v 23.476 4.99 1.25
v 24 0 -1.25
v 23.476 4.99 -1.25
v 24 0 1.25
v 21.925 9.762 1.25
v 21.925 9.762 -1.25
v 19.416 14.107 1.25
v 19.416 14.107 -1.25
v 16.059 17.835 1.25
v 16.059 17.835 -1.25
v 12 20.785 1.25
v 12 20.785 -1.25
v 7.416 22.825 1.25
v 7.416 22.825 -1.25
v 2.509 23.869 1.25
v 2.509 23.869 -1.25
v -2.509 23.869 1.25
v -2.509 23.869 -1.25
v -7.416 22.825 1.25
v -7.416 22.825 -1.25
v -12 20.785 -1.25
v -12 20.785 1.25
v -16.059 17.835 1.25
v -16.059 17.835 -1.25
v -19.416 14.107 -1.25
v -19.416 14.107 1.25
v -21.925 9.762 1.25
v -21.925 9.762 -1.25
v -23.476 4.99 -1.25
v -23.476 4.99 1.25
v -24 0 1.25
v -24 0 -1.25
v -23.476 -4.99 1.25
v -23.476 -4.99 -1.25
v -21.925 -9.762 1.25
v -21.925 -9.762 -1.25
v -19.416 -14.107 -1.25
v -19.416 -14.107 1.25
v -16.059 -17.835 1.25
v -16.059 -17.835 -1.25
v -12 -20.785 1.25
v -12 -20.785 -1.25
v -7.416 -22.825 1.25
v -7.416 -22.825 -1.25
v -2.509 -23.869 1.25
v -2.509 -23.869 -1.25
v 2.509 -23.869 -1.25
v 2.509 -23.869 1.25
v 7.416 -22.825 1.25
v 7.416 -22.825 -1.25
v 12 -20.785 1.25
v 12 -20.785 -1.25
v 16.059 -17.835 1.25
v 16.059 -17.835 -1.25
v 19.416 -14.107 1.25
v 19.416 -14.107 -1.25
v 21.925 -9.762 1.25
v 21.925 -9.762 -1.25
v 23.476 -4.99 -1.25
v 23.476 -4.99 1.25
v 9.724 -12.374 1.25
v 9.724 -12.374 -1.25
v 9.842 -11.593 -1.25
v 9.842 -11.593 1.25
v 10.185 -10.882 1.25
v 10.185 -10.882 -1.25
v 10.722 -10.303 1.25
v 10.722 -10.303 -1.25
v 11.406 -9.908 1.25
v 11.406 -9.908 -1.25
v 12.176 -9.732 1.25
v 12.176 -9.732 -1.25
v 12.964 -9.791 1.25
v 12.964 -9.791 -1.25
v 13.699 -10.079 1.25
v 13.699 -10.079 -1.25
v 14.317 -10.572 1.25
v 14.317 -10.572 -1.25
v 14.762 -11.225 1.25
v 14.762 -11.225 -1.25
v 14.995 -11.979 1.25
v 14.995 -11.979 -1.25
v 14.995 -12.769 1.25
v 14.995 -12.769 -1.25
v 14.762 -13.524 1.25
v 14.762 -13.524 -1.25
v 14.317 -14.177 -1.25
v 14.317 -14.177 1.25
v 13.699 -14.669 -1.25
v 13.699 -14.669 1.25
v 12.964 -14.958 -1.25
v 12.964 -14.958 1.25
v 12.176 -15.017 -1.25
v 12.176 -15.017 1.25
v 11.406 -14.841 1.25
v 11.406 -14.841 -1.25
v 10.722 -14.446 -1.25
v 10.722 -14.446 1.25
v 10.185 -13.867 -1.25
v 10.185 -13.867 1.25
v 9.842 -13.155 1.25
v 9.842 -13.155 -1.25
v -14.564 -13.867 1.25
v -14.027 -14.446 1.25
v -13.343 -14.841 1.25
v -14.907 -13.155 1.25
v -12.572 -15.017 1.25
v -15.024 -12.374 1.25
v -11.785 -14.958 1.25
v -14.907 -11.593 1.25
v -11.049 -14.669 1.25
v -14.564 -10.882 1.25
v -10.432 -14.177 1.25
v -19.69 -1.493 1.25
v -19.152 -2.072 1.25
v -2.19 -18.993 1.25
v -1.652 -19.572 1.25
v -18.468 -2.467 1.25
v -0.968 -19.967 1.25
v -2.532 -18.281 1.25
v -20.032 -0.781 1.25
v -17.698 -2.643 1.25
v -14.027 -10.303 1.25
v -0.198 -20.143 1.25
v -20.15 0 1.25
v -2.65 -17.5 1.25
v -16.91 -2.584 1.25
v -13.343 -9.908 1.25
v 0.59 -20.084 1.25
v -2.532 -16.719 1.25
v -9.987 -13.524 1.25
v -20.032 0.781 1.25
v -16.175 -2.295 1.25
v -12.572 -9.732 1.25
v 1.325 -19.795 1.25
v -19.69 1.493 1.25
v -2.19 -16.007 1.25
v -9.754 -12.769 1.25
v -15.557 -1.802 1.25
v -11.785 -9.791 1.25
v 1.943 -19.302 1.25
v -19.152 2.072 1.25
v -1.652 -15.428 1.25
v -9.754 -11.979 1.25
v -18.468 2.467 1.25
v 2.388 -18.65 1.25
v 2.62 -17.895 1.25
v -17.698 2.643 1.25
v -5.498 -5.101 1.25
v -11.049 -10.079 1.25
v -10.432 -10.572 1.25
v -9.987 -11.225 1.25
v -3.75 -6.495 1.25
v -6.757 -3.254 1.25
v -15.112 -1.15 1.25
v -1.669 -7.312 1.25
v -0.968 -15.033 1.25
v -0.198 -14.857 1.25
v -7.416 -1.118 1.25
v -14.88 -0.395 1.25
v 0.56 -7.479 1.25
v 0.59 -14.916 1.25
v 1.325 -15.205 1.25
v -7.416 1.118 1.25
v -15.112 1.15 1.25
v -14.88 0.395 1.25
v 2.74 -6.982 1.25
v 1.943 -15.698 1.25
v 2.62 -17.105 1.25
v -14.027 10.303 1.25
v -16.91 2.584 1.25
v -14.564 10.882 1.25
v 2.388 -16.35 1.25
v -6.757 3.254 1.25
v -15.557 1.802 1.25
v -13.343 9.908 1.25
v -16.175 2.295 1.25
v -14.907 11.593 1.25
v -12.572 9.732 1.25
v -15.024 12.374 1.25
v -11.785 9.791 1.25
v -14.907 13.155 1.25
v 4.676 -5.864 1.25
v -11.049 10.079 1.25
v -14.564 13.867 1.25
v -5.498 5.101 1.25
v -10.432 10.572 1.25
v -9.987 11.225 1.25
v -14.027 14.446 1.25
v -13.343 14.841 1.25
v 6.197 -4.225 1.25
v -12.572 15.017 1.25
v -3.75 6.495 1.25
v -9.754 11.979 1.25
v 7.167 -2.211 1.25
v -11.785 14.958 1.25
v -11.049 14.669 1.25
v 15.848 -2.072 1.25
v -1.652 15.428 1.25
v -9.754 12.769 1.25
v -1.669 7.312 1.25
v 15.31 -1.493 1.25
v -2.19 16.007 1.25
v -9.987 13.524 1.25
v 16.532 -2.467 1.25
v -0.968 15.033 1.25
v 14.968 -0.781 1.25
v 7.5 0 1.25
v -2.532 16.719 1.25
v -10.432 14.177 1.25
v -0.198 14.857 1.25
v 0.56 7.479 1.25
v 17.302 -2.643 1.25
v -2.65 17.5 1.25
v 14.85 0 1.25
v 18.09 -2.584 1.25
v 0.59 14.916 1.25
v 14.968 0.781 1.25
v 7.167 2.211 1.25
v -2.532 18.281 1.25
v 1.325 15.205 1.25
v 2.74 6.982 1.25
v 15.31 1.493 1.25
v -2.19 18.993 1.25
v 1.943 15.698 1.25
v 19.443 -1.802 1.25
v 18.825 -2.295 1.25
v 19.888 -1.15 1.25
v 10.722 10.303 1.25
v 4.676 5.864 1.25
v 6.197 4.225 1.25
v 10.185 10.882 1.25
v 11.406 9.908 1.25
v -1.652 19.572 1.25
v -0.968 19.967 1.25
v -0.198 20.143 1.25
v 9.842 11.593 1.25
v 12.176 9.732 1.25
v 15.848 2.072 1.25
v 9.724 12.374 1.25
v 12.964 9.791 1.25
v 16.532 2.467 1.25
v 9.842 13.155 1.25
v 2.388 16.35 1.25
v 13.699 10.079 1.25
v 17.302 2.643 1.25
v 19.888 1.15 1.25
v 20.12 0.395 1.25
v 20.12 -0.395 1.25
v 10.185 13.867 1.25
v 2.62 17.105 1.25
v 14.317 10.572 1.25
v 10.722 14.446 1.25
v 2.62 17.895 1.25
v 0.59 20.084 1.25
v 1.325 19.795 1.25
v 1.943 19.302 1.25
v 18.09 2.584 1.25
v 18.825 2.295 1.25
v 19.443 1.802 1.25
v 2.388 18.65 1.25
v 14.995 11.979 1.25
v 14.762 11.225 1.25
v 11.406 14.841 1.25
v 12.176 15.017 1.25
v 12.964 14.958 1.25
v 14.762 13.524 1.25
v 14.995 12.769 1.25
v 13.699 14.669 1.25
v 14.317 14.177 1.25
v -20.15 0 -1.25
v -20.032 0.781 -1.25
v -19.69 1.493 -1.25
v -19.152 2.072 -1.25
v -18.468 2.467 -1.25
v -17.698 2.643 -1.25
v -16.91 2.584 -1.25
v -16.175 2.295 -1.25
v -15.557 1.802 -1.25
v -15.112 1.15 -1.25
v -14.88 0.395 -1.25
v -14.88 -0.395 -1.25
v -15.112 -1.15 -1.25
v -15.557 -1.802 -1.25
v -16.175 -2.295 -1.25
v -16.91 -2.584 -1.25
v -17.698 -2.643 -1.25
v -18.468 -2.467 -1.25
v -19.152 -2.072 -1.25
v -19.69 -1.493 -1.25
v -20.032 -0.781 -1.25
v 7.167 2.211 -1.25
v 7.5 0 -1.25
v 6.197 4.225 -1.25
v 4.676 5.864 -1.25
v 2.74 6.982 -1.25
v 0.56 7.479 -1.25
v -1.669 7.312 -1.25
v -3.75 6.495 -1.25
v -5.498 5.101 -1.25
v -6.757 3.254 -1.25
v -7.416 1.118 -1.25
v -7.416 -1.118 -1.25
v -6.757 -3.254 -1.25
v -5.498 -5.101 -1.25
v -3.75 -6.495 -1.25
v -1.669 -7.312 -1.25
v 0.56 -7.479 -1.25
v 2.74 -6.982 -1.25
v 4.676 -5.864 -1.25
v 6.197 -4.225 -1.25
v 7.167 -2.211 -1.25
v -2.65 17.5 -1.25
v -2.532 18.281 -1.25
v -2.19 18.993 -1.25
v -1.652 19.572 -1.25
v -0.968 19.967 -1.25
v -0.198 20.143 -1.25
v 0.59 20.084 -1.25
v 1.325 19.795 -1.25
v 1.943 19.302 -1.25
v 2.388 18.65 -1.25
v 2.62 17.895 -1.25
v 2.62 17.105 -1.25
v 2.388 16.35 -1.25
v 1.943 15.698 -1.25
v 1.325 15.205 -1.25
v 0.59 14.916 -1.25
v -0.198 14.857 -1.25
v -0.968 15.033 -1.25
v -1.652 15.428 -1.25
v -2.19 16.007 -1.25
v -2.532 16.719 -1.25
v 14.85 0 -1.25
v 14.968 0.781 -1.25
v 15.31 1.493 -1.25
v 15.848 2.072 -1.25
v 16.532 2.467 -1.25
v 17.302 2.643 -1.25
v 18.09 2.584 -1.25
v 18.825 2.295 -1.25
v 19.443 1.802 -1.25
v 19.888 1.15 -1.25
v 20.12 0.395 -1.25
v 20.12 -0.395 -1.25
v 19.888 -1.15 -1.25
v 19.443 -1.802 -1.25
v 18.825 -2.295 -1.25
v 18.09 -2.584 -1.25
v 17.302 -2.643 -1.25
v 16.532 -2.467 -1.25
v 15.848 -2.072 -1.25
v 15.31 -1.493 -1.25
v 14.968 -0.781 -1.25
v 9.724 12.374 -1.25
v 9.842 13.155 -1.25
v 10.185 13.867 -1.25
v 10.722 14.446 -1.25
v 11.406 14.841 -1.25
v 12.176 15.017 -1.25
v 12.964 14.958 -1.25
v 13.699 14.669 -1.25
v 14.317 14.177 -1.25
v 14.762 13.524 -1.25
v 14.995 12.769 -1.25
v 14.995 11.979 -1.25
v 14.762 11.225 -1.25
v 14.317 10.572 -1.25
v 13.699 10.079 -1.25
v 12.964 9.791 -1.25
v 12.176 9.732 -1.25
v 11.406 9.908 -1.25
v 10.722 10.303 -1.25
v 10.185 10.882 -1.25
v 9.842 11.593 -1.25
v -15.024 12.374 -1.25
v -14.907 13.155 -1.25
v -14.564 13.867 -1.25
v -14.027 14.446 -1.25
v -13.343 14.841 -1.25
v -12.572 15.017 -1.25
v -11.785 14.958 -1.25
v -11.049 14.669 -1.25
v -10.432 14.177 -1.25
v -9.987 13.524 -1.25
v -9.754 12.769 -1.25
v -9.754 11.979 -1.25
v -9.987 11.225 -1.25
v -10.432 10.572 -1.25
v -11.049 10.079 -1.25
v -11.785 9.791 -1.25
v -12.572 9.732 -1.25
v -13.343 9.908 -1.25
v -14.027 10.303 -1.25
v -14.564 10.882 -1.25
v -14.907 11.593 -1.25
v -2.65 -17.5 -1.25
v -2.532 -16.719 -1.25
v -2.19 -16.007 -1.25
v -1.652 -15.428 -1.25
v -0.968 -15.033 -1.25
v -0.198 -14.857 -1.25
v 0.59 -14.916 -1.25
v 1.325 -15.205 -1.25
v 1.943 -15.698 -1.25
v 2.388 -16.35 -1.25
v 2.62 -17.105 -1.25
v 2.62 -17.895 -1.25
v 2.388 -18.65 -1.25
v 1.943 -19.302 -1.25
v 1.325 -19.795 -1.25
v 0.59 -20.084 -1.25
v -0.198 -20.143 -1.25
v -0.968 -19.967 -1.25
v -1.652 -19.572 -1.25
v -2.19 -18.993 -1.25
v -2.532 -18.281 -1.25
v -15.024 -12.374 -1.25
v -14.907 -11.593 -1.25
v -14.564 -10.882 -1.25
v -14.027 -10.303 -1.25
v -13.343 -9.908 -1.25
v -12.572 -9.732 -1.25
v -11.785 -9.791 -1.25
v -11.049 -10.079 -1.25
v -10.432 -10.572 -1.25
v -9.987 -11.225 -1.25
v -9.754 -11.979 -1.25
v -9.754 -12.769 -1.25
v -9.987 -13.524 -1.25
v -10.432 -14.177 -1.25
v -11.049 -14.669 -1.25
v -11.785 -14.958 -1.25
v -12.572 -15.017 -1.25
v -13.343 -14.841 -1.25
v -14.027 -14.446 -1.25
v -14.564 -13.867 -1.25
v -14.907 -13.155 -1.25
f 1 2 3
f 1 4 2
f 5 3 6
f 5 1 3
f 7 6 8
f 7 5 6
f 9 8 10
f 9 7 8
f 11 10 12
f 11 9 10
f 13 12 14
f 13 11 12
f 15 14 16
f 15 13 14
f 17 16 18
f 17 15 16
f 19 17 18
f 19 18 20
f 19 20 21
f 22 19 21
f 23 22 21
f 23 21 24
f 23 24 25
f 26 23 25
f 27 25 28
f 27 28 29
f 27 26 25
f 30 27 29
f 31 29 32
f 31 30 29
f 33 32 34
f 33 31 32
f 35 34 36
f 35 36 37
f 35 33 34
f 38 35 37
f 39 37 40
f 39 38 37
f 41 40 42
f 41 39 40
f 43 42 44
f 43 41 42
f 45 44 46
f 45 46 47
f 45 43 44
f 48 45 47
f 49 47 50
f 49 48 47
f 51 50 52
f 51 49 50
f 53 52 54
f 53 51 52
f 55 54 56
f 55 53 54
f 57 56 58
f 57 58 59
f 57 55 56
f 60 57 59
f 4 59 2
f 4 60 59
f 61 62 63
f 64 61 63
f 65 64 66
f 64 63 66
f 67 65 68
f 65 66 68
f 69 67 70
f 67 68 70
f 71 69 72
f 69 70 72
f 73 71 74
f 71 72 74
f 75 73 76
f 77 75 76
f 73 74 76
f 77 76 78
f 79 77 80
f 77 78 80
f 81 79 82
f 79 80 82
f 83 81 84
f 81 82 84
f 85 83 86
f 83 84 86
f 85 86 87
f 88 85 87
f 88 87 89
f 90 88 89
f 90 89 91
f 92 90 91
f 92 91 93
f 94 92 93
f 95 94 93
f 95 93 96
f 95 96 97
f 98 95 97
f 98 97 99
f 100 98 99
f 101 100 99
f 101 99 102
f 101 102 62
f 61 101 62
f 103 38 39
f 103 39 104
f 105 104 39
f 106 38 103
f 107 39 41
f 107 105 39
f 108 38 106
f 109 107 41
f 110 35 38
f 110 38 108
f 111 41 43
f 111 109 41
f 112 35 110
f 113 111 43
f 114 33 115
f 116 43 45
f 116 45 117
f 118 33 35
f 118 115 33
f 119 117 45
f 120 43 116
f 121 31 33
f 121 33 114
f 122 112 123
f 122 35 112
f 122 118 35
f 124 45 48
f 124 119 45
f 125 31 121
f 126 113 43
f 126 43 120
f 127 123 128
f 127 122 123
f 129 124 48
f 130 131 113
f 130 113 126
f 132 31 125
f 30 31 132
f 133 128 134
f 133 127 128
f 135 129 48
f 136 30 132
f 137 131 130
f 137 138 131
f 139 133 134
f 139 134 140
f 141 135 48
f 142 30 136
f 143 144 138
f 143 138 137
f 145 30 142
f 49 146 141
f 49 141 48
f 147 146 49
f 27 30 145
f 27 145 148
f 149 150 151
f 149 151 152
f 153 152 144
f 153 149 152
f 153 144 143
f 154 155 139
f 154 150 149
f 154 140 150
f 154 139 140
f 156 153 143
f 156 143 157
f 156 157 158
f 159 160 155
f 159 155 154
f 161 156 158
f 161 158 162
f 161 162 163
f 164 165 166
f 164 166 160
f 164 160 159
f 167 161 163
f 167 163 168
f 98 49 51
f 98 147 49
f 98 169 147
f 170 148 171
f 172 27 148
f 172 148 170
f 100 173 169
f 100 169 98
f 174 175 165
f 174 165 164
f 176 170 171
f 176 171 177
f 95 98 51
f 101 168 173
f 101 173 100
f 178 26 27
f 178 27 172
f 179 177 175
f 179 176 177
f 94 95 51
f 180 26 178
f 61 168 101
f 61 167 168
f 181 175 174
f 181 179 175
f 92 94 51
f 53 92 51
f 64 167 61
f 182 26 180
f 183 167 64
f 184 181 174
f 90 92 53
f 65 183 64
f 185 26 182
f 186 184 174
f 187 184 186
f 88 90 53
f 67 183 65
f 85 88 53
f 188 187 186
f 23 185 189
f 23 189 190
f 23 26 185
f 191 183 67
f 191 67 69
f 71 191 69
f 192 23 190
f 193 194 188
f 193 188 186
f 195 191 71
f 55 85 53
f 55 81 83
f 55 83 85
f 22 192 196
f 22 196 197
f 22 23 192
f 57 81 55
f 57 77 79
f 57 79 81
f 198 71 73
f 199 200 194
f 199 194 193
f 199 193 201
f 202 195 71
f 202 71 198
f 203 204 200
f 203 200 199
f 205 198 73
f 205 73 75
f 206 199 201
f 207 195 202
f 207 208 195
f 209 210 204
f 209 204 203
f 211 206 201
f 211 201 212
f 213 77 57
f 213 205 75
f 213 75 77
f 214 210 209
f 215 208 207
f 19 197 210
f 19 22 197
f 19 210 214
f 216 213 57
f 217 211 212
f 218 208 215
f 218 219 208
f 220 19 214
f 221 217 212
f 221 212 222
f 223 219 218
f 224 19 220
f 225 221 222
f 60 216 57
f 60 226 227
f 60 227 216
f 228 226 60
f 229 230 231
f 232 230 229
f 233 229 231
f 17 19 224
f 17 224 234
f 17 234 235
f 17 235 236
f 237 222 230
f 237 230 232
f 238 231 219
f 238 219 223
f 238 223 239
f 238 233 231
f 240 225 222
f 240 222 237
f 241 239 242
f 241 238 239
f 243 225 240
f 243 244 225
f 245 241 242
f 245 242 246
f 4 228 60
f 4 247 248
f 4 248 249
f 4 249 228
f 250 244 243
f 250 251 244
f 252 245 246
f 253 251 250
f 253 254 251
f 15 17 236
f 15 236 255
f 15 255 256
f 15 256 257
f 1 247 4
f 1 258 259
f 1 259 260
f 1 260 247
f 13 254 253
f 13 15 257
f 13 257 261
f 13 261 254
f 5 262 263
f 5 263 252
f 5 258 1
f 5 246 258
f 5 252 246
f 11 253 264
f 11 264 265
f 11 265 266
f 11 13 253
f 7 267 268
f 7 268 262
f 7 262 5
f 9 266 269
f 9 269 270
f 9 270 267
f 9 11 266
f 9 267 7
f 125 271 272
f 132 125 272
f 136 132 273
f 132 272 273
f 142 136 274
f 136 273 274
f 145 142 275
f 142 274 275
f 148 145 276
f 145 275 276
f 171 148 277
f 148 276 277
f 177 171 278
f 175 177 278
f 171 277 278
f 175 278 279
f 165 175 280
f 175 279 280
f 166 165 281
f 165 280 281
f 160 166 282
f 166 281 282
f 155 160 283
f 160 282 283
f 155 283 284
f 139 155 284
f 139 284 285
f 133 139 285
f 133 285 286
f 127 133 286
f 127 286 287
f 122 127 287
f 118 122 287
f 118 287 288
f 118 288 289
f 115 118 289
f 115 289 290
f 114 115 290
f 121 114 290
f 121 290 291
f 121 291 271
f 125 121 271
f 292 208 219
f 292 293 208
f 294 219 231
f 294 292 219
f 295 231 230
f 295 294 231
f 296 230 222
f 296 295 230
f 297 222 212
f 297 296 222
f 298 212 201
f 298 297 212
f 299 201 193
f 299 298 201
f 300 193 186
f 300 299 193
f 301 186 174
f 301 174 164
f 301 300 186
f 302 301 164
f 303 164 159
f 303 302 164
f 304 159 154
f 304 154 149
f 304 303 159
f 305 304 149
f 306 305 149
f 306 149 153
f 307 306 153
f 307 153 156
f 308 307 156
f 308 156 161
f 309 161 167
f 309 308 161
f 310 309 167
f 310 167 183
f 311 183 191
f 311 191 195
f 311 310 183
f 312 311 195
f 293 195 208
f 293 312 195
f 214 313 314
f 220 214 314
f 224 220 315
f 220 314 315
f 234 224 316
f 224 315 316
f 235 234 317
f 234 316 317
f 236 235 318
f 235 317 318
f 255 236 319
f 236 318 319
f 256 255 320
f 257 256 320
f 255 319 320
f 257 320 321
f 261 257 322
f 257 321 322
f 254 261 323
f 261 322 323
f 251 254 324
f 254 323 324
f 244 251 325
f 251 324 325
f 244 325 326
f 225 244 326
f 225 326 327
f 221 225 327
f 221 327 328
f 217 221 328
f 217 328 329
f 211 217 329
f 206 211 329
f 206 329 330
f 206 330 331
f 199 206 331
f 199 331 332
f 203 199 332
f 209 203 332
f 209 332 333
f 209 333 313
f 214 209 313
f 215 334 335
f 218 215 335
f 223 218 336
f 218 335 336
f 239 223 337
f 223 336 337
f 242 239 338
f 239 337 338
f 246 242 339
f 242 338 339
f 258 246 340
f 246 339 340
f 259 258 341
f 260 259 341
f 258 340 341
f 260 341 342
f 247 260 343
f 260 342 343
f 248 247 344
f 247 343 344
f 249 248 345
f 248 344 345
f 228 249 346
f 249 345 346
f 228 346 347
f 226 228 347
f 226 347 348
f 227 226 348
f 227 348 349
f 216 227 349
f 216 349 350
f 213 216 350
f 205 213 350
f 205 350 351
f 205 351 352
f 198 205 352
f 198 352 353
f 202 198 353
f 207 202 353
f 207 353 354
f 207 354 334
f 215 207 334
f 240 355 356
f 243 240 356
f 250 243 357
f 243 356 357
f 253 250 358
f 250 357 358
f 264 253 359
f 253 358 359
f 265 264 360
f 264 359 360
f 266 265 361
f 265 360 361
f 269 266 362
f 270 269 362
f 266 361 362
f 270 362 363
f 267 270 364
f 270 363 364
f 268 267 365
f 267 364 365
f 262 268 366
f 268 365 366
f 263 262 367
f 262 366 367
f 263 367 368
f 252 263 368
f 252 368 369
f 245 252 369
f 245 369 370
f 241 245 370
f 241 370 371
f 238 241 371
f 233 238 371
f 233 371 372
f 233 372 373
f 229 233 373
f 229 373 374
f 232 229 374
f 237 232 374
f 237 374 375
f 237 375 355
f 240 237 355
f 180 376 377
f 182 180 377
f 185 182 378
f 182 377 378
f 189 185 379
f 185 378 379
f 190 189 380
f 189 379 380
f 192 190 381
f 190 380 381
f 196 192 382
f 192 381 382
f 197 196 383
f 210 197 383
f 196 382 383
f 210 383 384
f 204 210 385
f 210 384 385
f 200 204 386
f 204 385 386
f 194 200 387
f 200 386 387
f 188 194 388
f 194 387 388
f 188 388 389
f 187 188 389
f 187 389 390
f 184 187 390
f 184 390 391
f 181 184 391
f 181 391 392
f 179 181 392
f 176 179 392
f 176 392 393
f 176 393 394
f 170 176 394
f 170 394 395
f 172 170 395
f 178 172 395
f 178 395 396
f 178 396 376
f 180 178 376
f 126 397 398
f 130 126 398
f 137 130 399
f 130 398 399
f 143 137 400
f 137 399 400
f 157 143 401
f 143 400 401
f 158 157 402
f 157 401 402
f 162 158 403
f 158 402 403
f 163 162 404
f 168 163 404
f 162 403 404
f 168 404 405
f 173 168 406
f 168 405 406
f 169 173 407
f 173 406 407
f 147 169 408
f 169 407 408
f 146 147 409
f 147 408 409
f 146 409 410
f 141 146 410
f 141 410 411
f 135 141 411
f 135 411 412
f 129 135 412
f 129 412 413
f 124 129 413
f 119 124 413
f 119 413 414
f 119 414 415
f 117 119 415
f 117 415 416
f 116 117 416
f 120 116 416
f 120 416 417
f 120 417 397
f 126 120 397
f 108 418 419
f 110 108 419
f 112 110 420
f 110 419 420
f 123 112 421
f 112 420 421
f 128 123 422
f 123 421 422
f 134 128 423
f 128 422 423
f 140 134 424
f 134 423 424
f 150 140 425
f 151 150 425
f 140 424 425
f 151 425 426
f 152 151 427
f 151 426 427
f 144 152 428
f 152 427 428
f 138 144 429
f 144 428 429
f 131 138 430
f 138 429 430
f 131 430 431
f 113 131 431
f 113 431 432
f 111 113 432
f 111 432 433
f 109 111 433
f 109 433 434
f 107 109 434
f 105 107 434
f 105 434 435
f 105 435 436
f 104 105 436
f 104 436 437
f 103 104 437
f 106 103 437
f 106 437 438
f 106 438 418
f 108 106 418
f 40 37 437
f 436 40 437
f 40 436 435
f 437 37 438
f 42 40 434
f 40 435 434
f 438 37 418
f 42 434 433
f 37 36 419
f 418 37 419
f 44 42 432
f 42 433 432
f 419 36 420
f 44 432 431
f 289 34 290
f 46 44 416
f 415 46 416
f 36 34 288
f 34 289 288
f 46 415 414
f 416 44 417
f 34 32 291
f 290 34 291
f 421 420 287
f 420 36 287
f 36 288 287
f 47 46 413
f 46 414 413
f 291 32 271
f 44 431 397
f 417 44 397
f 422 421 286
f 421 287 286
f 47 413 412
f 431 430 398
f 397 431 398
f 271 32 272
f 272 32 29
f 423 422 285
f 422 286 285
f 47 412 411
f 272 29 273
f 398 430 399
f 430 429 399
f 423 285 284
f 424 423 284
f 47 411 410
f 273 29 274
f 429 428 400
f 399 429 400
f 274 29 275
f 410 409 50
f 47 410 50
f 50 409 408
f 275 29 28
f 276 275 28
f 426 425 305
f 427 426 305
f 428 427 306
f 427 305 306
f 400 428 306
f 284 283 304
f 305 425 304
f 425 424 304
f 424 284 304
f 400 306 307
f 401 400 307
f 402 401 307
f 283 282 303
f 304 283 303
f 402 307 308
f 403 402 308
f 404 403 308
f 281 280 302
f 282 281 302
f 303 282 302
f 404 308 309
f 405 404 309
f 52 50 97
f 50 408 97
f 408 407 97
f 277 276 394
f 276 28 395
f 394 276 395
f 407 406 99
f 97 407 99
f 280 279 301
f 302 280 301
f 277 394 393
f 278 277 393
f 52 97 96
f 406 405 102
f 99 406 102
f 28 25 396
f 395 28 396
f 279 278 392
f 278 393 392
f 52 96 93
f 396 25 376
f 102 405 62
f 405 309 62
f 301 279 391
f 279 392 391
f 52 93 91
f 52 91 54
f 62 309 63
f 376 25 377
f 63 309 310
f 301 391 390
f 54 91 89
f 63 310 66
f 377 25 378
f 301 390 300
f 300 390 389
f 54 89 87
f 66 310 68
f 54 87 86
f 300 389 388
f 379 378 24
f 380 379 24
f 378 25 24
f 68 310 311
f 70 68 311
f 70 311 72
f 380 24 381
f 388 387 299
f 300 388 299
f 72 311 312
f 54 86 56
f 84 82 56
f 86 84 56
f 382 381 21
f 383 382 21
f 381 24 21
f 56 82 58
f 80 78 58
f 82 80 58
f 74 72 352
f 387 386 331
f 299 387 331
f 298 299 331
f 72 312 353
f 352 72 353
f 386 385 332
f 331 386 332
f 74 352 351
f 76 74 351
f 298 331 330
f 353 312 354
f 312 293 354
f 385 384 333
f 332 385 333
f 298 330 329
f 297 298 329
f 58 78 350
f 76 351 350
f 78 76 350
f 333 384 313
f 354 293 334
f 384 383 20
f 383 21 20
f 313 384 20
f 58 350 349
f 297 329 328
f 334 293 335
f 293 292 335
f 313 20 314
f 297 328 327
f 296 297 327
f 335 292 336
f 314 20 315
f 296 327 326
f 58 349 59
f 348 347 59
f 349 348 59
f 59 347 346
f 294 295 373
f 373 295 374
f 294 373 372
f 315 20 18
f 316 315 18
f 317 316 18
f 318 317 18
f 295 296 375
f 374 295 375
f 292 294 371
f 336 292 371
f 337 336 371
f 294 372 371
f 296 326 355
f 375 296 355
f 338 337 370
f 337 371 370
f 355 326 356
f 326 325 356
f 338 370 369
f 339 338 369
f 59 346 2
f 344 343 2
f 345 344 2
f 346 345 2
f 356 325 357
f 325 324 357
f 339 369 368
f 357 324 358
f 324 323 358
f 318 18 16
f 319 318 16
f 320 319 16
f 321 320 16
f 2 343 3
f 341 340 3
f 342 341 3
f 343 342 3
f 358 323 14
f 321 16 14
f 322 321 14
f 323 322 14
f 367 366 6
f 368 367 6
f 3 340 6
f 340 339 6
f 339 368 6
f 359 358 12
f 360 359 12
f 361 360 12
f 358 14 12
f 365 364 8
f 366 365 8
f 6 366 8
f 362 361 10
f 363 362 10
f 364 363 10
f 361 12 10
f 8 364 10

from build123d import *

# Parameters (mm, degrees)
SKETCH1_R            = 24
SKETCH1_R_2          = 7.5
BOSS_EXTRUDE1_DEPTH  = 1.25
M5_CLEARANCE_HOLE1_D = 5.3


with BuildPart() as part:
    # Sketch1 → Boss-Extrude1 (new, symmetric)
    with BuildSketch(Plane.XY):
        Circle(SKETCH1_R)
        Circle(SKETCH1_R_2, mode=Mode.SUBTRACT)
    extrude(amount=BOSS_EXTRUDE1_DEPTH, both=True)

    # M5 Clearance Hole1 (through all)
    with Locations(Plane.XY.offset(1.25)):
        with Locations((0, -17.5), (-12.374368671, -12.374368671), (-17.5, 0), (-12.374368671, 12.374368671), (0, 17.5), (12.374368671, 12.374368671), (17.5, 0), (12.374368671, -12.374368671)):
            Hole(M5_CLEARANCE_HOLE1_D / 2)


solid = part.part
